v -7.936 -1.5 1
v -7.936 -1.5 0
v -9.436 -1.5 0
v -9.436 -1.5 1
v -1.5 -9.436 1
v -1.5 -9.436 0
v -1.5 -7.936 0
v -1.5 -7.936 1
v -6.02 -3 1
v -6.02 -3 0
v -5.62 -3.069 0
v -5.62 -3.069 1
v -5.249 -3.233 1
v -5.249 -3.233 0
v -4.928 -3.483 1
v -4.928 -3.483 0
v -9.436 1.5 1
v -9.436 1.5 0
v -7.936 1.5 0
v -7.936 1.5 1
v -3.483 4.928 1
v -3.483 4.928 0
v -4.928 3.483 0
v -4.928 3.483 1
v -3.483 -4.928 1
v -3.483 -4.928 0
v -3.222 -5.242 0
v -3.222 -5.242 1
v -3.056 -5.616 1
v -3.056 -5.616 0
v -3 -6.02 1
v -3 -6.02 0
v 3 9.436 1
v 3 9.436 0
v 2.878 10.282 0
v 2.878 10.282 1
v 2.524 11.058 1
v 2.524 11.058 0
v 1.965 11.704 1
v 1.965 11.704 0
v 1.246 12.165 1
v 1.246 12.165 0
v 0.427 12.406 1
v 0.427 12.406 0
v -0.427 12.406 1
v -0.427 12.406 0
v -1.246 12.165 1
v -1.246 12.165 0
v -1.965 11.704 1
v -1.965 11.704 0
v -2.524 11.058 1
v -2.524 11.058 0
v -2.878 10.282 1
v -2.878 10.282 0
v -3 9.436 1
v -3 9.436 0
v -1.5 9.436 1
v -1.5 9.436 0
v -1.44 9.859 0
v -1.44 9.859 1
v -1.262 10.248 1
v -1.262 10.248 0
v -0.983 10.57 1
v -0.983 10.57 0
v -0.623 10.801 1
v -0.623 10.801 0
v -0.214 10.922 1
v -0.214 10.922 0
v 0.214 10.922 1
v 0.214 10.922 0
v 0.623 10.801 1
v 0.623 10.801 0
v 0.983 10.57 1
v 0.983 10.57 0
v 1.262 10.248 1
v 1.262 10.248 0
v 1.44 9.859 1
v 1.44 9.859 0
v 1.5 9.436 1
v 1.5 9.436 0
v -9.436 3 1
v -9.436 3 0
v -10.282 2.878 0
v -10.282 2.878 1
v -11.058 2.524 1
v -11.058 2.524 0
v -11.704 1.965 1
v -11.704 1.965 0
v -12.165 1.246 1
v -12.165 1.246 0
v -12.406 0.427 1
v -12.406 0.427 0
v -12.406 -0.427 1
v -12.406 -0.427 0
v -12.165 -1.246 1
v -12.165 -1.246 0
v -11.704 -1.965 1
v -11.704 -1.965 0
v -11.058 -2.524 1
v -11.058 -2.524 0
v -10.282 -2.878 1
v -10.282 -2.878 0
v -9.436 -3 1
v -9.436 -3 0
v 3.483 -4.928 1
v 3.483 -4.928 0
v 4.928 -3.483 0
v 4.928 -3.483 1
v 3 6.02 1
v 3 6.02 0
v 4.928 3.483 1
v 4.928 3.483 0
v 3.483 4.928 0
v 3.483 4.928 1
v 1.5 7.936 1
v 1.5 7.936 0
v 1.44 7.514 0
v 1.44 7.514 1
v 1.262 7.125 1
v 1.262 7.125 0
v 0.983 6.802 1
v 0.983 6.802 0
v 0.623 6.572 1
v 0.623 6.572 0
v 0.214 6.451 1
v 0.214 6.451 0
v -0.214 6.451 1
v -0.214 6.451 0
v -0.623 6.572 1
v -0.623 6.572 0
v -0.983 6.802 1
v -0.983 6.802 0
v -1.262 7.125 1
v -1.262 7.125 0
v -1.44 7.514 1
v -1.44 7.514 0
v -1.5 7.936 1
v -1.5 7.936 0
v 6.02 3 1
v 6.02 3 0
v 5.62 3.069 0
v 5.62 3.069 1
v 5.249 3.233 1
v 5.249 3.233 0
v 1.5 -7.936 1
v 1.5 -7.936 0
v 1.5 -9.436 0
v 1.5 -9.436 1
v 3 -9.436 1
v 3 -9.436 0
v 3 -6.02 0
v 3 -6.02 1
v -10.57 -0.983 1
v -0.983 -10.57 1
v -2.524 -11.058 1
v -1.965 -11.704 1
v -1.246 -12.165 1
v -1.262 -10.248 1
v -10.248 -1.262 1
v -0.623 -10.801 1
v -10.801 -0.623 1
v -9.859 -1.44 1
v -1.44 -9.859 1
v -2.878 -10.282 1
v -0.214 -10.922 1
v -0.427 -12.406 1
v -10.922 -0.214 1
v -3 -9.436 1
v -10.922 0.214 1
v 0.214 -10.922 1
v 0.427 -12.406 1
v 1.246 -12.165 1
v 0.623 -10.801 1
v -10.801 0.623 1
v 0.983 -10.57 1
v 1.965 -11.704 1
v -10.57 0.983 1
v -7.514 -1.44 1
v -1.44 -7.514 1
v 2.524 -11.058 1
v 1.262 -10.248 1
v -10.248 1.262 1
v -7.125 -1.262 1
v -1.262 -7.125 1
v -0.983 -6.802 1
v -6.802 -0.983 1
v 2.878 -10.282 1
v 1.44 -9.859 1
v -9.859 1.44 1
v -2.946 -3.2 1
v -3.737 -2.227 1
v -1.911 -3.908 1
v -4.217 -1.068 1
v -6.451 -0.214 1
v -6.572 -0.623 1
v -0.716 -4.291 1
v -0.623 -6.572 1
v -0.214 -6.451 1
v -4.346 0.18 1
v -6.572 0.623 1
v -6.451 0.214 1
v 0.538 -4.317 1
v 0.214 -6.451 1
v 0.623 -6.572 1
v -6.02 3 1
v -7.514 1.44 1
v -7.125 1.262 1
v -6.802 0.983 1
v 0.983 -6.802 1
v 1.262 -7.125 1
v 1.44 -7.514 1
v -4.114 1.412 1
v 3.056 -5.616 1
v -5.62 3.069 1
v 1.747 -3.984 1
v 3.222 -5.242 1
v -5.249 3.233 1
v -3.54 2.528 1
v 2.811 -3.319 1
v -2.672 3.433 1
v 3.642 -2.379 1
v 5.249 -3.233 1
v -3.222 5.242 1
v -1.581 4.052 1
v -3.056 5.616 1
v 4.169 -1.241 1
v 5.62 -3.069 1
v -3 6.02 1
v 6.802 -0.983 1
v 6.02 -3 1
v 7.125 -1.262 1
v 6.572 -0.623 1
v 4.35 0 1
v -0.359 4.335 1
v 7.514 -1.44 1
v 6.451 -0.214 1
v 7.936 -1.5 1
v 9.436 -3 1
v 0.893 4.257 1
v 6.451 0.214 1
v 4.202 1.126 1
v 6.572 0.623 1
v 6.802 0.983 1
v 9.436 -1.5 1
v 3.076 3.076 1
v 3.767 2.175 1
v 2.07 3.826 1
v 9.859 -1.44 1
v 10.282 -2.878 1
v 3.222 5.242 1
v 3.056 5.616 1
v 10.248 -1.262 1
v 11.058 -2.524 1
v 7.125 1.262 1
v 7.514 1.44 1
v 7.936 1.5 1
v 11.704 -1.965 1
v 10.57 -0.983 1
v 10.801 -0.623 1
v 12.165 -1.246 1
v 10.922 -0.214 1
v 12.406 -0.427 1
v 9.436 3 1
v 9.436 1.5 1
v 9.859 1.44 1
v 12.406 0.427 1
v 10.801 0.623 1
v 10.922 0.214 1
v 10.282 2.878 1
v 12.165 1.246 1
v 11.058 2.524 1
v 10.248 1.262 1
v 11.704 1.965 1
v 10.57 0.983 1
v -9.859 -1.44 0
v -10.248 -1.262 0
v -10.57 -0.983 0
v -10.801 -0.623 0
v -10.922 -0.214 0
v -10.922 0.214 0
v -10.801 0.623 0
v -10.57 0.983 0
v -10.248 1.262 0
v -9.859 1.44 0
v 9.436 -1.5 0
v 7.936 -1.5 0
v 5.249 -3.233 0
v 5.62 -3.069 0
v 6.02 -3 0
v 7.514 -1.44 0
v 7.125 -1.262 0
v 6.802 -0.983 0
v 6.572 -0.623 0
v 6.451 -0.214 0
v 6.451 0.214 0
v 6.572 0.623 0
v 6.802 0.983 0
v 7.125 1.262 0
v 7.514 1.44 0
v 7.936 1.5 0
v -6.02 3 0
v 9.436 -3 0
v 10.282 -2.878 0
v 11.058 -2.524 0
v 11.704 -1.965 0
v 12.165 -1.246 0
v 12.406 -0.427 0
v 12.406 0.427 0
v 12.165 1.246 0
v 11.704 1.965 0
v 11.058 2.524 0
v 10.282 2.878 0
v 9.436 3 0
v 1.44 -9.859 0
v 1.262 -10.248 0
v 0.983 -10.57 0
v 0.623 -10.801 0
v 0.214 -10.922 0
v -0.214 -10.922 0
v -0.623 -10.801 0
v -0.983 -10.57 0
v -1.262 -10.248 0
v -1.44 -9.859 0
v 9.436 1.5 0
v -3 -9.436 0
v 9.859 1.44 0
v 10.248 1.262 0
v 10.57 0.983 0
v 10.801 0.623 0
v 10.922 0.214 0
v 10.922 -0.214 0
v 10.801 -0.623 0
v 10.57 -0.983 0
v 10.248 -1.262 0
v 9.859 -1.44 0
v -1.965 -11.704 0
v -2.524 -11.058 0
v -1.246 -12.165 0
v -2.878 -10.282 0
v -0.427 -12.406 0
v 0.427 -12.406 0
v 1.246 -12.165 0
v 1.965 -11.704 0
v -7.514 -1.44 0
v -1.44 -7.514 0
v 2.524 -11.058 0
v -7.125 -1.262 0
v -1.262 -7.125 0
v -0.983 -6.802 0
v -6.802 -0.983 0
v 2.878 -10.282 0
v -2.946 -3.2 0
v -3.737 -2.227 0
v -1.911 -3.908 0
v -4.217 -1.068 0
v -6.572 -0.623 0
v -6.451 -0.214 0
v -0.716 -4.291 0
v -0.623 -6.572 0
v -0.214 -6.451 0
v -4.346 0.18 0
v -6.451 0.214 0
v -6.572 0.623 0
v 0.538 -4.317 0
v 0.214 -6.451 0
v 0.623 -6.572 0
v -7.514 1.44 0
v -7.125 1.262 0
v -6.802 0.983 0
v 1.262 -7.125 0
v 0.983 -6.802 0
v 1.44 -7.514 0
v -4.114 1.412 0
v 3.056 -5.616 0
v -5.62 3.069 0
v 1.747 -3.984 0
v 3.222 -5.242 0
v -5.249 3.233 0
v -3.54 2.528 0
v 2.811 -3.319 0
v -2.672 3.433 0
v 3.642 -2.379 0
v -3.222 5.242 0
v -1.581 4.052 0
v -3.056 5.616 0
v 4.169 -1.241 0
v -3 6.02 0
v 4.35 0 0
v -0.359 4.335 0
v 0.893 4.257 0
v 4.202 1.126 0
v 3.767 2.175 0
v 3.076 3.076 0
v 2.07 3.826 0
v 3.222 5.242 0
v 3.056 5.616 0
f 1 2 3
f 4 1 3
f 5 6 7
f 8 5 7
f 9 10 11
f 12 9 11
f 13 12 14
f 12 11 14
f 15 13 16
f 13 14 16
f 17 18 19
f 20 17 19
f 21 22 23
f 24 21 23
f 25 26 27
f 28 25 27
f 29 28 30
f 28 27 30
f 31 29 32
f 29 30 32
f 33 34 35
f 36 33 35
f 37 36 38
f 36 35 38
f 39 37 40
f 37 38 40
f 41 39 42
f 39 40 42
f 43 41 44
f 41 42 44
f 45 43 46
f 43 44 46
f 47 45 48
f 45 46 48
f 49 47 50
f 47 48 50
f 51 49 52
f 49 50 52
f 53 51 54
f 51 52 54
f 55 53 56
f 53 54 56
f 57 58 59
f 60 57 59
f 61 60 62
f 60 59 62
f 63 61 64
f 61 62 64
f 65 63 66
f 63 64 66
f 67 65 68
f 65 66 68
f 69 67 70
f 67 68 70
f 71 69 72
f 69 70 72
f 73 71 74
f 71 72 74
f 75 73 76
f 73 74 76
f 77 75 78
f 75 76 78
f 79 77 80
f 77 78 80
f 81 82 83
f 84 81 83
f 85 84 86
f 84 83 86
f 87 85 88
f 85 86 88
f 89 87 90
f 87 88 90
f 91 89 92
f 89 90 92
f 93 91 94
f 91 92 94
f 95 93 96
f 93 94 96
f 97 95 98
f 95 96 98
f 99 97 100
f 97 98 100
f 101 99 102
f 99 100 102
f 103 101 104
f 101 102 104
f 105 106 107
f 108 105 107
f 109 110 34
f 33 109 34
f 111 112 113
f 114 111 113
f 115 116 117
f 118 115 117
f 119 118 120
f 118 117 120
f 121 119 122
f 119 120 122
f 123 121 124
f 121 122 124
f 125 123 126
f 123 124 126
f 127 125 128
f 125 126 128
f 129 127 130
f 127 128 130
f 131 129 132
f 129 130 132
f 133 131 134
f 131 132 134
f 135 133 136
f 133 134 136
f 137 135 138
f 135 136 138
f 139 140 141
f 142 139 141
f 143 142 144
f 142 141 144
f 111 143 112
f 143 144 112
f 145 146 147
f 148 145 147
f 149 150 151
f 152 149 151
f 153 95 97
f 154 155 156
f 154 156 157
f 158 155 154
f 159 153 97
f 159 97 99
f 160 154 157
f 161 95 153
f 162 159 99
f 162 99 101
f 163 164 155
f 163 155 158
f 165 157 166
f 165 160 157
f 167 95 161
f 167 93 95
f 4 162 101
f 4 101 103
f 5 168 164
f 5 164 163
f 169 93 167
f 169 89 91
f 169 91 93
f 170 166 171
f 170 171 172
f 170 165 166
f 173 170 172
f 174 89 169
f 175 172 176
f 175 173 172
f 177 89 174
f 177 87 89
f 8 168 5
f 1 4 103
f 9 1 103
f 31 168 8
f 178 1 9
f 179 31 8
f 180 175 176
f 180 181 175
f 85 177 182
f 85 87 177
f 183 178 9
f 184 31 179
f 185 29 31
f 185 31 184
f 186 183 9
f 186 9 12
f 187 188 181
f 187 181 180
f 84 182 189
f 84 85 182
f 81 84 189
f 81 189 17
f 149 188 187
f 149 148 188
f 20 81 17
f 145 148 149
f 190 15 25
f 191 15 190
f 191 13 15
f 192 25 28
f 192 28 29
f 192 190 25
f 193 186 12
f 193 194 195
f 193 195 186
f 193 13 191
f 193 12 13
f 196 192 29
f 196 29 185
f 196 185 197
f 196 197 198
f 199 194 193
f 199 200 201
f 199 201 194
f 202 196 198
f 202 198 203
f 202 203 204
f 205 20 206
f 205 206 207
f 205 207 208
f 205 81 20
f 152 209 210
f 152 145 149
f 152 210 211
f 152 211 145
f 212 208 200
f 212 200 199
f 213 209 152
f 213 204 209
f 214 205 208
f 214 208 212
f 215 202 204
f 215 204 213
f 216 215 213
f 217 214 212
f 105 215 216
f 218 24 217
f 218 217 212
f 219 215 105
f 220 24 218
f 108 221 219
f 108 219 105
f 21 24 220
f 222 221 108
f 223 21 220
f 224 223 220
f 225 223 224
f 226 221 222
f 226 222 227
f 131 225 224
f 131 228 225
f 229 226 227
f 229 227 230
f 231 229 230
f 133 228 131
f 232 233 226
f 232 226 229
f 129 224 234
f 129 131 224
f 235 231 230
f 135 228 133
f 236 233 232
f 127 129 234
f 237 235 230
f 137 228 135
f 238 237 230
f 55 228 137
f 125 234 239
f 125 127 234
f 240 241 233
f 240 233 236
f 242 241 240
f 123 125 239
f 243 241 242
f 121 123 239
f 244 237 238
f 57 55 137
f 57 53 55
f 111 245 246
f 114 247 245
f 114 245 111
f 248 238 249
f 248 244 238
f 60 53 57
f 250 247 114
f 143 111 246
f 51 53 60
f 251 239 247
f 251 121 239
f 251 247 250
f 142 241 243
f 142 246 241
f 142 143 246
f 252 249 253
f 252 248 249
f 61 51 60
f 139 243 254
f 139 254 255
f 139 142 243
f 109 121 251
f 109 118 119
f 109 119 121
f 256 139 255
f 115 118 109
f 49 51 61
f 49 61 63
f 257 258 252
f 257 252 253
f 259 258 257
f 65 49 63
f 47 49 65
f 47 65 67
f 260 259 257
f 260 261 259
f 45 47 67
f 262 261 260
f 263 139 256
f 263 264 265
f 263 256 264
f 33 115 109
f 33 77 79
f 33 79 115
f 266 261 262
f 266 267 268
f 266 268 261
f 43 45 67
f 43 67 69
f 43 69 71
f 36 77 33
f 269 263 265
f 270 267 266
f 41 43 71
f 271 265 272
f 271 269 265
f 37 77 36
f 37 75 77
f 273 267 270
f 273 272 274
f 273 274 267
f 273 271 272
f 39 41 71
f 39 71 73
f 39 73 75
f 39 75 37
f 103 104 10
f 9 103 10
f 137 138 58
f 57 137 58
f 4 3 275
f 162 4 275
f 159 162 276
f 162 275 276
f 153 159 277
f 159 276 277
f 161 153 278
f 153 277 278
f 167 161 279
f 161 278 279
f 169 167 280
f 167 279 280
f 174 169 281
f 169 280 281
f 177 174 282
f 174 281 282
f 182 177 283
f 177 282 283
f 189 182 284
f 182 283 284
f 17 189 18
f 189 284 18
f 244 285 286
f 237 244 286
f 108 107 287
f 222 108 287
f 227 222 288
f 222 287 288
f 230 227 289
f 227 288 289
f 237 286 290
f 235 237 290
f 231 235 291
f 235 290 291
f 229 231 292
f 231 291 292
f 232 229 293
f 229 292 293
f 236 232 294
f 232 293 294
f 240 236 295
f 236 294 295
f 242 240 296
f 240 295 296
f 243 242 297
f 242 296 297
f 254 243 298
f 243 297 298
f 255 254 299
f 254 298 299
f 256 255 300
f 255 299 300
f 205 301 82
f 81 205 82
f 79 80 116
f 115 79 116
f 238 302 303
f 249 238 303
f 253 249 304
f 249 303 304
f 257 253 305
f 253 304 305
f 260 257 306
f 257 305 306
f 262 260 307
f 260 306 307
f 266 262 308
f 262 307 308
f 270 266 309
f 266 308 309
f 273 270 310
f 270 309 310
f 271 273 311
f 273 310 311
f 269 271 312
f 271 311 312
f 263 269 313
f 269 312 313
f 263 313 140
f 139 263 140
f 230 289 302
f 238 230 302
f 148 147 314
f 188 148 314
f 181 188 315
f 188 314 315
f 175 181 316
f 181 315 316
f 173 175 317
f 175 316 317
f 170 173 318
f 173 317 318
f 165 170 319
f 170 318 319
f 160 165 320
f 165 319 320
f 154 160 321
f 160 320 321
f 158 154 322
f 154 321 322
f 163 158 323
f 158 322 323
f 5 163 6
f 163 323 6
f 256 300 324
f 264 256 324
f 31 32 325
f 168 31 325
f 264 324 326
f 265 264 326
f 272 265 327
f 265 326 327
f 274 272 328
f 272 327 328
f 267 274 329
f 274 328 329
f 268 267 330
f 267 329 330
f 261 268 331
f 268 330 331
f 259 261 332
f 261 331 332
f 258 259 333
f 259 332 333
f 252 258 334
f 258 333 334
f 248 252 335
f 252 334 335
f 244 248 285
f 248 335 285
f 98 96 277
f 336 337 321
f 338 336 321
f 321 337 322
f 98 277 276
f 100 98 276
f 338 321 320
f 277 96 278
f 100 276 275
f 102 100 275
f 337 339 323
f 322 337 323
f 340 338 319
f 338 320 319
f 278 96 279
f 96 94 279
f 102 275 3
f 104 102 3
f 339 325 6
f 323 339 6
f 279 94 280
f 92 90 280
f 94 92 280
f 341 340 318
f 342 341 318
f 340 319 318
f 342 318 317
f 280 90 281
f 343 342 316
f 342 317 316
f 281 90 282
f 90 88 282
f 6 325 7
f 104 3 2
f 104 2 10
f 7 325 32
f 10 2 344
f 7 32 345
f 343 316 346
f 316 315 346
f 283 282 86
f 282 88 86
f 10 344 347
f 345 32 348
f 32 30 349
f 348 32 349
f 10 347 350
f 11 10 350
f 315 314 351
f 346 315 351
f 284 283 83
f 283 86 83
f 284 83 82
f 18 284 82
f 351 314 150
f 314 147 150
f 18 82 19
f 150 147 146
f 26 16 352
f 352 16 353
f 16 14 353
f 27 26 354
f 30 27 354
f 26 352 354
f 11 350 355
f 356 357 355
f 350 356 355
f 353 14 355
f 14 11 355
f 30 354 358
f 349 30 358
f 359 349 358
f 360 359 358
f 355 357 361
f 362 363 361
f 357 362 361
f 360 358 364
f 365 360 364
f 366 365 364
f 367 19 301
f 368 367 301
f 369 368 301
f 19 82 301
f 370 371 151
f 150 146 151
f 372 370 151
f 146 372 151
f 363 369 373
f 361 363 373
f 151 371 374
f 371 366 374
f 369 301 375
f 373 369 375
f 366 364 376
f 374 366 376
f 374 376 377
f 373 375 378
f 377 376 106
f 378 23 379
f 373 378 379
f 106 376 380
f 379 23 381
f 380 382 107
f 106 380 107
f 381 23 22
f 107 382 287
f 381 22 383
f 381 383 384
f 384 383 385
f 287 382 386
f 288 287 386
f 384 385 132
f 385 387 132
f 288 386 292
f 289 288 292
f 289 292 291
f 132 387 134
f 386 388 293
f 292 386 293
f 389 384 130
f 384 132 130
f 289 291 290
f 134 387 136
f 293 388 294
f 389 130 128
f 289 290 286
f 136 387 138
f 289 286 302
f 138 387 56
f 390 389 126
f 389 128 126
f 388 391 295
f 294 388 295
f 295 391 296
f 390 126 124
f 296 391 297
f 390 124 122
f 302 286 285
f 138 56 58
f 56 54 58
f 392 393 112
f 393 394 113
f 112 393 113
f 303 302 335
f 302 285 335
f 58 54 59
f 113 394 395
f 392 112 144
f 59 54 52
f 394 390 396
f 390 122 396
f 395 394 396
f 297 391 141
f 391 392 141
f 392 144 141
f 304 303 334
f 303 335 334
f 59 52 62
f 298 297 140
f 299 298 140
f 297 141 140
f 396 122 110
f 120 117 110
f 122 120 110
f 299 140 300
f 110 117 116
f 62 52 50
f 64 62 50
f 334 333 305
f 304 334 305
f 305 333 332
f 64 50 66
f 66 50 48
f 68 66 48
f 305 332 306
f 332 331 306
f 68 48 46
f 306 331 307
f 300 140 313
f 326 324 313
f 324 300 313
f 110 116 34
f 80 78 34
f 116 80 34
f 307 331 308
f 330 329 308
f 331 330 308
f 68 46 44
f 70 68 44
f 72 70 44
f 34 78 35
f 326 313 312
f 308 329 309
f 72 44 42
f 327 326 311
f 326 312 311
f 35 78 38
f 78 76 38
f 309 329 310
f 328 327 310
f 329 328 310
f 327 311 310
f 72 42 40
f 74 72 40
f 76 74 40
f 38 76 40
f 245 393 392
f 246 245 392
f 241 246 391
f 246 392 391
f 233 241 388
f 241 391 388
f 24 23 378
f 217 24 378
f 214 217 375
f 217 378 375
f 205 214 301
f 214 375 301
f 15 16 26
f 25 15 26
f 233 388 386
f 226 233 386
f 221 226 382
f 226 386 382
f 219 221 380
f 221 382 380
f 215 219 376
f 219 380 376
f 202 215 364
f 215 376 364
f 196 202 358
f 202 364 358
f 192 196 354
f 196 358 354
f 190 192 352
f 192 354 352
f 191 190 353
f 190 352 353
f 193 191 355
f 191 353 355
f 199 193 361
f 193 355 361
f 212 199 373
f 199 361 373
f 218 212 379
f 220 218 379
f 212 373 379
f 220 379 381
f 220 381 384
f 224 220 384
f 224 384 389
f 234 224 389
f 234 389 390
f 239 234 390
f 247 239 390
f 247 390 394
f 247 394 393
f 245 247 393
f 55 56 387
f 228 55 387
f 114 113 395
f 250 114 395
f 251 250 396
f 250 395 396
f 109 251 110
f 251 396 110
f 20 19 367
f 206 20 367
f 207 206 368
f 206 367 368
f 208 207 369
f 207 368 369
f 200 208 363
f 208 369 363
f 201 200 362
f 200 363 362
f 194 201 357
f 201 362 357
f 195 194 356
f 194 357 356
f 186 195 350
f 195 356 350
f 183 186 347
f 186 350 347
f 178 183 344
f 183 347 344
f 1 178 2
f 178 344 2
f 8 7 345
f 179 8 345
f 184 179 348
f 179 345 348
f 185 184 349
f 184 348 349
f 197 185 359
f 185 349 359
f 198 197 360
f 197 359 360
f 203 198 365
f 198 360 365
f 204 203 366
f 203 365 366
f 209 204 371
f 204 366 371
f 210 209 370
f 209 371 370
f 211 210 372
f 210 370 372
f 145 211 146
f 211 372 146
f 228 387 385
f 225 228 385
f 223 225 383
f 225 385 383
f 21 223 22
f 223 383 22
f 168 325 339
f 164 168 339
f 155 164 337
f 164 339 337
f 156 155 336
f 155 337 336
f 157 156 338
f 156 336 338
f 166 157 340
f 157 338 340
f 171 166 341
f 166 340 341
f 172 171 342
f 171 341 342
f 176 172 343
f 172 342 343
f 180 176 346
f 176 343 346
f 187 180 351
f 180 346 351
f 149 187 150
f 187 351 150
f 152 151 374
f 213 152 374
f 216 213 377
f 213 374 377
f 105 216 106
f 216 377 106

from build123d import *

# Parameters (mm, degrees)
F1_DEPTH = 1


with BuildPart() as f1:
    # F0 (on Top) → F1 (new body)
    with BuildSketch(Plane.XY):
        with BuildLine():
            Line((-4.928222, -3.4827), (-3.4827, -4.928222))
            ThreePointArc((-3.4827, -4.928222), (-3.126054, -5.423345), (-3, -6.020383))
            Line((-3, -6.020383), (-3, -9.436451))
            ThreePointArc((-3, -9.436451), (0, -12.436451), (3, -9.436451))
            Line((3, -9.436451), (3, -6.020383))
            ThreePointArc((3, -6.020383), (3.126054, -5.423345), (3.4827, -4.928222))
            Line((3.4827, -4.928222), (4.928222, -3.4827))
            ThreePointArc((4.928222, -3.4827), (5.42923, -3.13937), (6.020383, -3))
            Line((6.020383, -3), (9.436451, -3))
            ThreePointArc((9.436451, -3), (12.436451, 0), (9.436451, 3))
            Line((9.436451, 3), (6.020383, 3))
            ThreePointArc((6.020383, 3), (5.42923, 3.13937), (4.928222, 3.4827))
            Line((4.928222, 3.4827), (3.4827, 4.928222))
            ThreePointArc((3.4827, 4.928222), (3.126054, 5.423345), (3, 6.020383))
            Line((3, 6.020383), (3, 9.436451))
            ThreePointArc((3, 9.436451), (0, 12.436451), (-3, 9.436451))
            Line((-3, 9.436451), (-3, 6.020383))
            ThreePointArc((-3, 6.020383), (-3.126054, 5.423345), (-3.4827, 4.928222))
            Line((-3.4827, 4.928222), (-4.928222, 3.4827))
            ThreePointArc((-4.928222, 3.4827), (-5.42923, 3.13937), (-6.020383, 3))
            Line((-6.020383, 3), (-9.436451, 3))
            ThreePointArc((-9.436451, 3), (-12.436451, 0), (-9.436451, -3))
            Line((-9.436451, -3), (-6.020383, -3))
            ThreePointArc((-6.020383, -3), (-5.42923, -3.13937), (-4.928222, -3.4827))
        make_face()
        with BuildLine():
            ThreePointArc((-1.500459, -7.936451), (0, -6.435991), (1.500459, -7.936451))
            Line((1.500459, -7.936451), (1.500459, -9.436451))
            ThreePointArc((1.500459, -9.436451), (0, -10.93691), (-1.500459, -9.436451))
            Line((-1.500459, -9.436451), (-1.500459, -7.936451))
        make_face(mode=Mode.SUBTRACT)
        with BuildLine():
            Line((-9.436451, 1.500459), (-7.936451, 1.500459))
            ThreePointArc((-7.936451, 1.500459), (-6.435991, 0), (-7.936451, -1.500459))
            Line((-7.936451, -1.500459), (-9.436451, -1.500459))
            ThreePointArc((-9.436451, -1.500459), (-10.93691, 0), (-9.436451, 1.500459))
        make_face(mode=Mode.SUBTRACT)
        with BuildLine():
            ThreePointArc((3.075914, 3.075914), (4.018876, 1.664673), (4.35, 0))
            ThreePointArc((4.35, 0), (-4.018876, -1.664673), (3.075914, 3.075914))
        make_face(mode=Mode.SUBTRACT)
        with BuildLine():
            Line((9.436451, -1.500459), (7.936451, -1.500459))
            ThreePointArc((7.936451, -1.500459), (6.435991, 0), (7.936451, 1.500459))
            Line((7.936451, 1.500459), (9.436451, 1.500459))
            ThreePointArc((9.436451, 1.500459), (10.93691, 0), (9.436451, -1.500459))
        make_face(mode=Mode.SUBTRACT)
        with BuildLine():
            Line((1.500459, 9.436451), (1.500459, 7.936451))
            ThreePointArc((1.500459, 7.936451), (0, 6.435991), (-1.500459, 7.936451))
            Line((-1.500459, 7.936451), (-1.500459, 9.436451))
            ThreePointArc((-1.500459, 9.436451), (0, 10.93691), (1.500459, 9.436451))
        make_face(mode=Mode.SUBTRACT)
    extrude(amount=F1_DEPTH)


solid = f1.part
